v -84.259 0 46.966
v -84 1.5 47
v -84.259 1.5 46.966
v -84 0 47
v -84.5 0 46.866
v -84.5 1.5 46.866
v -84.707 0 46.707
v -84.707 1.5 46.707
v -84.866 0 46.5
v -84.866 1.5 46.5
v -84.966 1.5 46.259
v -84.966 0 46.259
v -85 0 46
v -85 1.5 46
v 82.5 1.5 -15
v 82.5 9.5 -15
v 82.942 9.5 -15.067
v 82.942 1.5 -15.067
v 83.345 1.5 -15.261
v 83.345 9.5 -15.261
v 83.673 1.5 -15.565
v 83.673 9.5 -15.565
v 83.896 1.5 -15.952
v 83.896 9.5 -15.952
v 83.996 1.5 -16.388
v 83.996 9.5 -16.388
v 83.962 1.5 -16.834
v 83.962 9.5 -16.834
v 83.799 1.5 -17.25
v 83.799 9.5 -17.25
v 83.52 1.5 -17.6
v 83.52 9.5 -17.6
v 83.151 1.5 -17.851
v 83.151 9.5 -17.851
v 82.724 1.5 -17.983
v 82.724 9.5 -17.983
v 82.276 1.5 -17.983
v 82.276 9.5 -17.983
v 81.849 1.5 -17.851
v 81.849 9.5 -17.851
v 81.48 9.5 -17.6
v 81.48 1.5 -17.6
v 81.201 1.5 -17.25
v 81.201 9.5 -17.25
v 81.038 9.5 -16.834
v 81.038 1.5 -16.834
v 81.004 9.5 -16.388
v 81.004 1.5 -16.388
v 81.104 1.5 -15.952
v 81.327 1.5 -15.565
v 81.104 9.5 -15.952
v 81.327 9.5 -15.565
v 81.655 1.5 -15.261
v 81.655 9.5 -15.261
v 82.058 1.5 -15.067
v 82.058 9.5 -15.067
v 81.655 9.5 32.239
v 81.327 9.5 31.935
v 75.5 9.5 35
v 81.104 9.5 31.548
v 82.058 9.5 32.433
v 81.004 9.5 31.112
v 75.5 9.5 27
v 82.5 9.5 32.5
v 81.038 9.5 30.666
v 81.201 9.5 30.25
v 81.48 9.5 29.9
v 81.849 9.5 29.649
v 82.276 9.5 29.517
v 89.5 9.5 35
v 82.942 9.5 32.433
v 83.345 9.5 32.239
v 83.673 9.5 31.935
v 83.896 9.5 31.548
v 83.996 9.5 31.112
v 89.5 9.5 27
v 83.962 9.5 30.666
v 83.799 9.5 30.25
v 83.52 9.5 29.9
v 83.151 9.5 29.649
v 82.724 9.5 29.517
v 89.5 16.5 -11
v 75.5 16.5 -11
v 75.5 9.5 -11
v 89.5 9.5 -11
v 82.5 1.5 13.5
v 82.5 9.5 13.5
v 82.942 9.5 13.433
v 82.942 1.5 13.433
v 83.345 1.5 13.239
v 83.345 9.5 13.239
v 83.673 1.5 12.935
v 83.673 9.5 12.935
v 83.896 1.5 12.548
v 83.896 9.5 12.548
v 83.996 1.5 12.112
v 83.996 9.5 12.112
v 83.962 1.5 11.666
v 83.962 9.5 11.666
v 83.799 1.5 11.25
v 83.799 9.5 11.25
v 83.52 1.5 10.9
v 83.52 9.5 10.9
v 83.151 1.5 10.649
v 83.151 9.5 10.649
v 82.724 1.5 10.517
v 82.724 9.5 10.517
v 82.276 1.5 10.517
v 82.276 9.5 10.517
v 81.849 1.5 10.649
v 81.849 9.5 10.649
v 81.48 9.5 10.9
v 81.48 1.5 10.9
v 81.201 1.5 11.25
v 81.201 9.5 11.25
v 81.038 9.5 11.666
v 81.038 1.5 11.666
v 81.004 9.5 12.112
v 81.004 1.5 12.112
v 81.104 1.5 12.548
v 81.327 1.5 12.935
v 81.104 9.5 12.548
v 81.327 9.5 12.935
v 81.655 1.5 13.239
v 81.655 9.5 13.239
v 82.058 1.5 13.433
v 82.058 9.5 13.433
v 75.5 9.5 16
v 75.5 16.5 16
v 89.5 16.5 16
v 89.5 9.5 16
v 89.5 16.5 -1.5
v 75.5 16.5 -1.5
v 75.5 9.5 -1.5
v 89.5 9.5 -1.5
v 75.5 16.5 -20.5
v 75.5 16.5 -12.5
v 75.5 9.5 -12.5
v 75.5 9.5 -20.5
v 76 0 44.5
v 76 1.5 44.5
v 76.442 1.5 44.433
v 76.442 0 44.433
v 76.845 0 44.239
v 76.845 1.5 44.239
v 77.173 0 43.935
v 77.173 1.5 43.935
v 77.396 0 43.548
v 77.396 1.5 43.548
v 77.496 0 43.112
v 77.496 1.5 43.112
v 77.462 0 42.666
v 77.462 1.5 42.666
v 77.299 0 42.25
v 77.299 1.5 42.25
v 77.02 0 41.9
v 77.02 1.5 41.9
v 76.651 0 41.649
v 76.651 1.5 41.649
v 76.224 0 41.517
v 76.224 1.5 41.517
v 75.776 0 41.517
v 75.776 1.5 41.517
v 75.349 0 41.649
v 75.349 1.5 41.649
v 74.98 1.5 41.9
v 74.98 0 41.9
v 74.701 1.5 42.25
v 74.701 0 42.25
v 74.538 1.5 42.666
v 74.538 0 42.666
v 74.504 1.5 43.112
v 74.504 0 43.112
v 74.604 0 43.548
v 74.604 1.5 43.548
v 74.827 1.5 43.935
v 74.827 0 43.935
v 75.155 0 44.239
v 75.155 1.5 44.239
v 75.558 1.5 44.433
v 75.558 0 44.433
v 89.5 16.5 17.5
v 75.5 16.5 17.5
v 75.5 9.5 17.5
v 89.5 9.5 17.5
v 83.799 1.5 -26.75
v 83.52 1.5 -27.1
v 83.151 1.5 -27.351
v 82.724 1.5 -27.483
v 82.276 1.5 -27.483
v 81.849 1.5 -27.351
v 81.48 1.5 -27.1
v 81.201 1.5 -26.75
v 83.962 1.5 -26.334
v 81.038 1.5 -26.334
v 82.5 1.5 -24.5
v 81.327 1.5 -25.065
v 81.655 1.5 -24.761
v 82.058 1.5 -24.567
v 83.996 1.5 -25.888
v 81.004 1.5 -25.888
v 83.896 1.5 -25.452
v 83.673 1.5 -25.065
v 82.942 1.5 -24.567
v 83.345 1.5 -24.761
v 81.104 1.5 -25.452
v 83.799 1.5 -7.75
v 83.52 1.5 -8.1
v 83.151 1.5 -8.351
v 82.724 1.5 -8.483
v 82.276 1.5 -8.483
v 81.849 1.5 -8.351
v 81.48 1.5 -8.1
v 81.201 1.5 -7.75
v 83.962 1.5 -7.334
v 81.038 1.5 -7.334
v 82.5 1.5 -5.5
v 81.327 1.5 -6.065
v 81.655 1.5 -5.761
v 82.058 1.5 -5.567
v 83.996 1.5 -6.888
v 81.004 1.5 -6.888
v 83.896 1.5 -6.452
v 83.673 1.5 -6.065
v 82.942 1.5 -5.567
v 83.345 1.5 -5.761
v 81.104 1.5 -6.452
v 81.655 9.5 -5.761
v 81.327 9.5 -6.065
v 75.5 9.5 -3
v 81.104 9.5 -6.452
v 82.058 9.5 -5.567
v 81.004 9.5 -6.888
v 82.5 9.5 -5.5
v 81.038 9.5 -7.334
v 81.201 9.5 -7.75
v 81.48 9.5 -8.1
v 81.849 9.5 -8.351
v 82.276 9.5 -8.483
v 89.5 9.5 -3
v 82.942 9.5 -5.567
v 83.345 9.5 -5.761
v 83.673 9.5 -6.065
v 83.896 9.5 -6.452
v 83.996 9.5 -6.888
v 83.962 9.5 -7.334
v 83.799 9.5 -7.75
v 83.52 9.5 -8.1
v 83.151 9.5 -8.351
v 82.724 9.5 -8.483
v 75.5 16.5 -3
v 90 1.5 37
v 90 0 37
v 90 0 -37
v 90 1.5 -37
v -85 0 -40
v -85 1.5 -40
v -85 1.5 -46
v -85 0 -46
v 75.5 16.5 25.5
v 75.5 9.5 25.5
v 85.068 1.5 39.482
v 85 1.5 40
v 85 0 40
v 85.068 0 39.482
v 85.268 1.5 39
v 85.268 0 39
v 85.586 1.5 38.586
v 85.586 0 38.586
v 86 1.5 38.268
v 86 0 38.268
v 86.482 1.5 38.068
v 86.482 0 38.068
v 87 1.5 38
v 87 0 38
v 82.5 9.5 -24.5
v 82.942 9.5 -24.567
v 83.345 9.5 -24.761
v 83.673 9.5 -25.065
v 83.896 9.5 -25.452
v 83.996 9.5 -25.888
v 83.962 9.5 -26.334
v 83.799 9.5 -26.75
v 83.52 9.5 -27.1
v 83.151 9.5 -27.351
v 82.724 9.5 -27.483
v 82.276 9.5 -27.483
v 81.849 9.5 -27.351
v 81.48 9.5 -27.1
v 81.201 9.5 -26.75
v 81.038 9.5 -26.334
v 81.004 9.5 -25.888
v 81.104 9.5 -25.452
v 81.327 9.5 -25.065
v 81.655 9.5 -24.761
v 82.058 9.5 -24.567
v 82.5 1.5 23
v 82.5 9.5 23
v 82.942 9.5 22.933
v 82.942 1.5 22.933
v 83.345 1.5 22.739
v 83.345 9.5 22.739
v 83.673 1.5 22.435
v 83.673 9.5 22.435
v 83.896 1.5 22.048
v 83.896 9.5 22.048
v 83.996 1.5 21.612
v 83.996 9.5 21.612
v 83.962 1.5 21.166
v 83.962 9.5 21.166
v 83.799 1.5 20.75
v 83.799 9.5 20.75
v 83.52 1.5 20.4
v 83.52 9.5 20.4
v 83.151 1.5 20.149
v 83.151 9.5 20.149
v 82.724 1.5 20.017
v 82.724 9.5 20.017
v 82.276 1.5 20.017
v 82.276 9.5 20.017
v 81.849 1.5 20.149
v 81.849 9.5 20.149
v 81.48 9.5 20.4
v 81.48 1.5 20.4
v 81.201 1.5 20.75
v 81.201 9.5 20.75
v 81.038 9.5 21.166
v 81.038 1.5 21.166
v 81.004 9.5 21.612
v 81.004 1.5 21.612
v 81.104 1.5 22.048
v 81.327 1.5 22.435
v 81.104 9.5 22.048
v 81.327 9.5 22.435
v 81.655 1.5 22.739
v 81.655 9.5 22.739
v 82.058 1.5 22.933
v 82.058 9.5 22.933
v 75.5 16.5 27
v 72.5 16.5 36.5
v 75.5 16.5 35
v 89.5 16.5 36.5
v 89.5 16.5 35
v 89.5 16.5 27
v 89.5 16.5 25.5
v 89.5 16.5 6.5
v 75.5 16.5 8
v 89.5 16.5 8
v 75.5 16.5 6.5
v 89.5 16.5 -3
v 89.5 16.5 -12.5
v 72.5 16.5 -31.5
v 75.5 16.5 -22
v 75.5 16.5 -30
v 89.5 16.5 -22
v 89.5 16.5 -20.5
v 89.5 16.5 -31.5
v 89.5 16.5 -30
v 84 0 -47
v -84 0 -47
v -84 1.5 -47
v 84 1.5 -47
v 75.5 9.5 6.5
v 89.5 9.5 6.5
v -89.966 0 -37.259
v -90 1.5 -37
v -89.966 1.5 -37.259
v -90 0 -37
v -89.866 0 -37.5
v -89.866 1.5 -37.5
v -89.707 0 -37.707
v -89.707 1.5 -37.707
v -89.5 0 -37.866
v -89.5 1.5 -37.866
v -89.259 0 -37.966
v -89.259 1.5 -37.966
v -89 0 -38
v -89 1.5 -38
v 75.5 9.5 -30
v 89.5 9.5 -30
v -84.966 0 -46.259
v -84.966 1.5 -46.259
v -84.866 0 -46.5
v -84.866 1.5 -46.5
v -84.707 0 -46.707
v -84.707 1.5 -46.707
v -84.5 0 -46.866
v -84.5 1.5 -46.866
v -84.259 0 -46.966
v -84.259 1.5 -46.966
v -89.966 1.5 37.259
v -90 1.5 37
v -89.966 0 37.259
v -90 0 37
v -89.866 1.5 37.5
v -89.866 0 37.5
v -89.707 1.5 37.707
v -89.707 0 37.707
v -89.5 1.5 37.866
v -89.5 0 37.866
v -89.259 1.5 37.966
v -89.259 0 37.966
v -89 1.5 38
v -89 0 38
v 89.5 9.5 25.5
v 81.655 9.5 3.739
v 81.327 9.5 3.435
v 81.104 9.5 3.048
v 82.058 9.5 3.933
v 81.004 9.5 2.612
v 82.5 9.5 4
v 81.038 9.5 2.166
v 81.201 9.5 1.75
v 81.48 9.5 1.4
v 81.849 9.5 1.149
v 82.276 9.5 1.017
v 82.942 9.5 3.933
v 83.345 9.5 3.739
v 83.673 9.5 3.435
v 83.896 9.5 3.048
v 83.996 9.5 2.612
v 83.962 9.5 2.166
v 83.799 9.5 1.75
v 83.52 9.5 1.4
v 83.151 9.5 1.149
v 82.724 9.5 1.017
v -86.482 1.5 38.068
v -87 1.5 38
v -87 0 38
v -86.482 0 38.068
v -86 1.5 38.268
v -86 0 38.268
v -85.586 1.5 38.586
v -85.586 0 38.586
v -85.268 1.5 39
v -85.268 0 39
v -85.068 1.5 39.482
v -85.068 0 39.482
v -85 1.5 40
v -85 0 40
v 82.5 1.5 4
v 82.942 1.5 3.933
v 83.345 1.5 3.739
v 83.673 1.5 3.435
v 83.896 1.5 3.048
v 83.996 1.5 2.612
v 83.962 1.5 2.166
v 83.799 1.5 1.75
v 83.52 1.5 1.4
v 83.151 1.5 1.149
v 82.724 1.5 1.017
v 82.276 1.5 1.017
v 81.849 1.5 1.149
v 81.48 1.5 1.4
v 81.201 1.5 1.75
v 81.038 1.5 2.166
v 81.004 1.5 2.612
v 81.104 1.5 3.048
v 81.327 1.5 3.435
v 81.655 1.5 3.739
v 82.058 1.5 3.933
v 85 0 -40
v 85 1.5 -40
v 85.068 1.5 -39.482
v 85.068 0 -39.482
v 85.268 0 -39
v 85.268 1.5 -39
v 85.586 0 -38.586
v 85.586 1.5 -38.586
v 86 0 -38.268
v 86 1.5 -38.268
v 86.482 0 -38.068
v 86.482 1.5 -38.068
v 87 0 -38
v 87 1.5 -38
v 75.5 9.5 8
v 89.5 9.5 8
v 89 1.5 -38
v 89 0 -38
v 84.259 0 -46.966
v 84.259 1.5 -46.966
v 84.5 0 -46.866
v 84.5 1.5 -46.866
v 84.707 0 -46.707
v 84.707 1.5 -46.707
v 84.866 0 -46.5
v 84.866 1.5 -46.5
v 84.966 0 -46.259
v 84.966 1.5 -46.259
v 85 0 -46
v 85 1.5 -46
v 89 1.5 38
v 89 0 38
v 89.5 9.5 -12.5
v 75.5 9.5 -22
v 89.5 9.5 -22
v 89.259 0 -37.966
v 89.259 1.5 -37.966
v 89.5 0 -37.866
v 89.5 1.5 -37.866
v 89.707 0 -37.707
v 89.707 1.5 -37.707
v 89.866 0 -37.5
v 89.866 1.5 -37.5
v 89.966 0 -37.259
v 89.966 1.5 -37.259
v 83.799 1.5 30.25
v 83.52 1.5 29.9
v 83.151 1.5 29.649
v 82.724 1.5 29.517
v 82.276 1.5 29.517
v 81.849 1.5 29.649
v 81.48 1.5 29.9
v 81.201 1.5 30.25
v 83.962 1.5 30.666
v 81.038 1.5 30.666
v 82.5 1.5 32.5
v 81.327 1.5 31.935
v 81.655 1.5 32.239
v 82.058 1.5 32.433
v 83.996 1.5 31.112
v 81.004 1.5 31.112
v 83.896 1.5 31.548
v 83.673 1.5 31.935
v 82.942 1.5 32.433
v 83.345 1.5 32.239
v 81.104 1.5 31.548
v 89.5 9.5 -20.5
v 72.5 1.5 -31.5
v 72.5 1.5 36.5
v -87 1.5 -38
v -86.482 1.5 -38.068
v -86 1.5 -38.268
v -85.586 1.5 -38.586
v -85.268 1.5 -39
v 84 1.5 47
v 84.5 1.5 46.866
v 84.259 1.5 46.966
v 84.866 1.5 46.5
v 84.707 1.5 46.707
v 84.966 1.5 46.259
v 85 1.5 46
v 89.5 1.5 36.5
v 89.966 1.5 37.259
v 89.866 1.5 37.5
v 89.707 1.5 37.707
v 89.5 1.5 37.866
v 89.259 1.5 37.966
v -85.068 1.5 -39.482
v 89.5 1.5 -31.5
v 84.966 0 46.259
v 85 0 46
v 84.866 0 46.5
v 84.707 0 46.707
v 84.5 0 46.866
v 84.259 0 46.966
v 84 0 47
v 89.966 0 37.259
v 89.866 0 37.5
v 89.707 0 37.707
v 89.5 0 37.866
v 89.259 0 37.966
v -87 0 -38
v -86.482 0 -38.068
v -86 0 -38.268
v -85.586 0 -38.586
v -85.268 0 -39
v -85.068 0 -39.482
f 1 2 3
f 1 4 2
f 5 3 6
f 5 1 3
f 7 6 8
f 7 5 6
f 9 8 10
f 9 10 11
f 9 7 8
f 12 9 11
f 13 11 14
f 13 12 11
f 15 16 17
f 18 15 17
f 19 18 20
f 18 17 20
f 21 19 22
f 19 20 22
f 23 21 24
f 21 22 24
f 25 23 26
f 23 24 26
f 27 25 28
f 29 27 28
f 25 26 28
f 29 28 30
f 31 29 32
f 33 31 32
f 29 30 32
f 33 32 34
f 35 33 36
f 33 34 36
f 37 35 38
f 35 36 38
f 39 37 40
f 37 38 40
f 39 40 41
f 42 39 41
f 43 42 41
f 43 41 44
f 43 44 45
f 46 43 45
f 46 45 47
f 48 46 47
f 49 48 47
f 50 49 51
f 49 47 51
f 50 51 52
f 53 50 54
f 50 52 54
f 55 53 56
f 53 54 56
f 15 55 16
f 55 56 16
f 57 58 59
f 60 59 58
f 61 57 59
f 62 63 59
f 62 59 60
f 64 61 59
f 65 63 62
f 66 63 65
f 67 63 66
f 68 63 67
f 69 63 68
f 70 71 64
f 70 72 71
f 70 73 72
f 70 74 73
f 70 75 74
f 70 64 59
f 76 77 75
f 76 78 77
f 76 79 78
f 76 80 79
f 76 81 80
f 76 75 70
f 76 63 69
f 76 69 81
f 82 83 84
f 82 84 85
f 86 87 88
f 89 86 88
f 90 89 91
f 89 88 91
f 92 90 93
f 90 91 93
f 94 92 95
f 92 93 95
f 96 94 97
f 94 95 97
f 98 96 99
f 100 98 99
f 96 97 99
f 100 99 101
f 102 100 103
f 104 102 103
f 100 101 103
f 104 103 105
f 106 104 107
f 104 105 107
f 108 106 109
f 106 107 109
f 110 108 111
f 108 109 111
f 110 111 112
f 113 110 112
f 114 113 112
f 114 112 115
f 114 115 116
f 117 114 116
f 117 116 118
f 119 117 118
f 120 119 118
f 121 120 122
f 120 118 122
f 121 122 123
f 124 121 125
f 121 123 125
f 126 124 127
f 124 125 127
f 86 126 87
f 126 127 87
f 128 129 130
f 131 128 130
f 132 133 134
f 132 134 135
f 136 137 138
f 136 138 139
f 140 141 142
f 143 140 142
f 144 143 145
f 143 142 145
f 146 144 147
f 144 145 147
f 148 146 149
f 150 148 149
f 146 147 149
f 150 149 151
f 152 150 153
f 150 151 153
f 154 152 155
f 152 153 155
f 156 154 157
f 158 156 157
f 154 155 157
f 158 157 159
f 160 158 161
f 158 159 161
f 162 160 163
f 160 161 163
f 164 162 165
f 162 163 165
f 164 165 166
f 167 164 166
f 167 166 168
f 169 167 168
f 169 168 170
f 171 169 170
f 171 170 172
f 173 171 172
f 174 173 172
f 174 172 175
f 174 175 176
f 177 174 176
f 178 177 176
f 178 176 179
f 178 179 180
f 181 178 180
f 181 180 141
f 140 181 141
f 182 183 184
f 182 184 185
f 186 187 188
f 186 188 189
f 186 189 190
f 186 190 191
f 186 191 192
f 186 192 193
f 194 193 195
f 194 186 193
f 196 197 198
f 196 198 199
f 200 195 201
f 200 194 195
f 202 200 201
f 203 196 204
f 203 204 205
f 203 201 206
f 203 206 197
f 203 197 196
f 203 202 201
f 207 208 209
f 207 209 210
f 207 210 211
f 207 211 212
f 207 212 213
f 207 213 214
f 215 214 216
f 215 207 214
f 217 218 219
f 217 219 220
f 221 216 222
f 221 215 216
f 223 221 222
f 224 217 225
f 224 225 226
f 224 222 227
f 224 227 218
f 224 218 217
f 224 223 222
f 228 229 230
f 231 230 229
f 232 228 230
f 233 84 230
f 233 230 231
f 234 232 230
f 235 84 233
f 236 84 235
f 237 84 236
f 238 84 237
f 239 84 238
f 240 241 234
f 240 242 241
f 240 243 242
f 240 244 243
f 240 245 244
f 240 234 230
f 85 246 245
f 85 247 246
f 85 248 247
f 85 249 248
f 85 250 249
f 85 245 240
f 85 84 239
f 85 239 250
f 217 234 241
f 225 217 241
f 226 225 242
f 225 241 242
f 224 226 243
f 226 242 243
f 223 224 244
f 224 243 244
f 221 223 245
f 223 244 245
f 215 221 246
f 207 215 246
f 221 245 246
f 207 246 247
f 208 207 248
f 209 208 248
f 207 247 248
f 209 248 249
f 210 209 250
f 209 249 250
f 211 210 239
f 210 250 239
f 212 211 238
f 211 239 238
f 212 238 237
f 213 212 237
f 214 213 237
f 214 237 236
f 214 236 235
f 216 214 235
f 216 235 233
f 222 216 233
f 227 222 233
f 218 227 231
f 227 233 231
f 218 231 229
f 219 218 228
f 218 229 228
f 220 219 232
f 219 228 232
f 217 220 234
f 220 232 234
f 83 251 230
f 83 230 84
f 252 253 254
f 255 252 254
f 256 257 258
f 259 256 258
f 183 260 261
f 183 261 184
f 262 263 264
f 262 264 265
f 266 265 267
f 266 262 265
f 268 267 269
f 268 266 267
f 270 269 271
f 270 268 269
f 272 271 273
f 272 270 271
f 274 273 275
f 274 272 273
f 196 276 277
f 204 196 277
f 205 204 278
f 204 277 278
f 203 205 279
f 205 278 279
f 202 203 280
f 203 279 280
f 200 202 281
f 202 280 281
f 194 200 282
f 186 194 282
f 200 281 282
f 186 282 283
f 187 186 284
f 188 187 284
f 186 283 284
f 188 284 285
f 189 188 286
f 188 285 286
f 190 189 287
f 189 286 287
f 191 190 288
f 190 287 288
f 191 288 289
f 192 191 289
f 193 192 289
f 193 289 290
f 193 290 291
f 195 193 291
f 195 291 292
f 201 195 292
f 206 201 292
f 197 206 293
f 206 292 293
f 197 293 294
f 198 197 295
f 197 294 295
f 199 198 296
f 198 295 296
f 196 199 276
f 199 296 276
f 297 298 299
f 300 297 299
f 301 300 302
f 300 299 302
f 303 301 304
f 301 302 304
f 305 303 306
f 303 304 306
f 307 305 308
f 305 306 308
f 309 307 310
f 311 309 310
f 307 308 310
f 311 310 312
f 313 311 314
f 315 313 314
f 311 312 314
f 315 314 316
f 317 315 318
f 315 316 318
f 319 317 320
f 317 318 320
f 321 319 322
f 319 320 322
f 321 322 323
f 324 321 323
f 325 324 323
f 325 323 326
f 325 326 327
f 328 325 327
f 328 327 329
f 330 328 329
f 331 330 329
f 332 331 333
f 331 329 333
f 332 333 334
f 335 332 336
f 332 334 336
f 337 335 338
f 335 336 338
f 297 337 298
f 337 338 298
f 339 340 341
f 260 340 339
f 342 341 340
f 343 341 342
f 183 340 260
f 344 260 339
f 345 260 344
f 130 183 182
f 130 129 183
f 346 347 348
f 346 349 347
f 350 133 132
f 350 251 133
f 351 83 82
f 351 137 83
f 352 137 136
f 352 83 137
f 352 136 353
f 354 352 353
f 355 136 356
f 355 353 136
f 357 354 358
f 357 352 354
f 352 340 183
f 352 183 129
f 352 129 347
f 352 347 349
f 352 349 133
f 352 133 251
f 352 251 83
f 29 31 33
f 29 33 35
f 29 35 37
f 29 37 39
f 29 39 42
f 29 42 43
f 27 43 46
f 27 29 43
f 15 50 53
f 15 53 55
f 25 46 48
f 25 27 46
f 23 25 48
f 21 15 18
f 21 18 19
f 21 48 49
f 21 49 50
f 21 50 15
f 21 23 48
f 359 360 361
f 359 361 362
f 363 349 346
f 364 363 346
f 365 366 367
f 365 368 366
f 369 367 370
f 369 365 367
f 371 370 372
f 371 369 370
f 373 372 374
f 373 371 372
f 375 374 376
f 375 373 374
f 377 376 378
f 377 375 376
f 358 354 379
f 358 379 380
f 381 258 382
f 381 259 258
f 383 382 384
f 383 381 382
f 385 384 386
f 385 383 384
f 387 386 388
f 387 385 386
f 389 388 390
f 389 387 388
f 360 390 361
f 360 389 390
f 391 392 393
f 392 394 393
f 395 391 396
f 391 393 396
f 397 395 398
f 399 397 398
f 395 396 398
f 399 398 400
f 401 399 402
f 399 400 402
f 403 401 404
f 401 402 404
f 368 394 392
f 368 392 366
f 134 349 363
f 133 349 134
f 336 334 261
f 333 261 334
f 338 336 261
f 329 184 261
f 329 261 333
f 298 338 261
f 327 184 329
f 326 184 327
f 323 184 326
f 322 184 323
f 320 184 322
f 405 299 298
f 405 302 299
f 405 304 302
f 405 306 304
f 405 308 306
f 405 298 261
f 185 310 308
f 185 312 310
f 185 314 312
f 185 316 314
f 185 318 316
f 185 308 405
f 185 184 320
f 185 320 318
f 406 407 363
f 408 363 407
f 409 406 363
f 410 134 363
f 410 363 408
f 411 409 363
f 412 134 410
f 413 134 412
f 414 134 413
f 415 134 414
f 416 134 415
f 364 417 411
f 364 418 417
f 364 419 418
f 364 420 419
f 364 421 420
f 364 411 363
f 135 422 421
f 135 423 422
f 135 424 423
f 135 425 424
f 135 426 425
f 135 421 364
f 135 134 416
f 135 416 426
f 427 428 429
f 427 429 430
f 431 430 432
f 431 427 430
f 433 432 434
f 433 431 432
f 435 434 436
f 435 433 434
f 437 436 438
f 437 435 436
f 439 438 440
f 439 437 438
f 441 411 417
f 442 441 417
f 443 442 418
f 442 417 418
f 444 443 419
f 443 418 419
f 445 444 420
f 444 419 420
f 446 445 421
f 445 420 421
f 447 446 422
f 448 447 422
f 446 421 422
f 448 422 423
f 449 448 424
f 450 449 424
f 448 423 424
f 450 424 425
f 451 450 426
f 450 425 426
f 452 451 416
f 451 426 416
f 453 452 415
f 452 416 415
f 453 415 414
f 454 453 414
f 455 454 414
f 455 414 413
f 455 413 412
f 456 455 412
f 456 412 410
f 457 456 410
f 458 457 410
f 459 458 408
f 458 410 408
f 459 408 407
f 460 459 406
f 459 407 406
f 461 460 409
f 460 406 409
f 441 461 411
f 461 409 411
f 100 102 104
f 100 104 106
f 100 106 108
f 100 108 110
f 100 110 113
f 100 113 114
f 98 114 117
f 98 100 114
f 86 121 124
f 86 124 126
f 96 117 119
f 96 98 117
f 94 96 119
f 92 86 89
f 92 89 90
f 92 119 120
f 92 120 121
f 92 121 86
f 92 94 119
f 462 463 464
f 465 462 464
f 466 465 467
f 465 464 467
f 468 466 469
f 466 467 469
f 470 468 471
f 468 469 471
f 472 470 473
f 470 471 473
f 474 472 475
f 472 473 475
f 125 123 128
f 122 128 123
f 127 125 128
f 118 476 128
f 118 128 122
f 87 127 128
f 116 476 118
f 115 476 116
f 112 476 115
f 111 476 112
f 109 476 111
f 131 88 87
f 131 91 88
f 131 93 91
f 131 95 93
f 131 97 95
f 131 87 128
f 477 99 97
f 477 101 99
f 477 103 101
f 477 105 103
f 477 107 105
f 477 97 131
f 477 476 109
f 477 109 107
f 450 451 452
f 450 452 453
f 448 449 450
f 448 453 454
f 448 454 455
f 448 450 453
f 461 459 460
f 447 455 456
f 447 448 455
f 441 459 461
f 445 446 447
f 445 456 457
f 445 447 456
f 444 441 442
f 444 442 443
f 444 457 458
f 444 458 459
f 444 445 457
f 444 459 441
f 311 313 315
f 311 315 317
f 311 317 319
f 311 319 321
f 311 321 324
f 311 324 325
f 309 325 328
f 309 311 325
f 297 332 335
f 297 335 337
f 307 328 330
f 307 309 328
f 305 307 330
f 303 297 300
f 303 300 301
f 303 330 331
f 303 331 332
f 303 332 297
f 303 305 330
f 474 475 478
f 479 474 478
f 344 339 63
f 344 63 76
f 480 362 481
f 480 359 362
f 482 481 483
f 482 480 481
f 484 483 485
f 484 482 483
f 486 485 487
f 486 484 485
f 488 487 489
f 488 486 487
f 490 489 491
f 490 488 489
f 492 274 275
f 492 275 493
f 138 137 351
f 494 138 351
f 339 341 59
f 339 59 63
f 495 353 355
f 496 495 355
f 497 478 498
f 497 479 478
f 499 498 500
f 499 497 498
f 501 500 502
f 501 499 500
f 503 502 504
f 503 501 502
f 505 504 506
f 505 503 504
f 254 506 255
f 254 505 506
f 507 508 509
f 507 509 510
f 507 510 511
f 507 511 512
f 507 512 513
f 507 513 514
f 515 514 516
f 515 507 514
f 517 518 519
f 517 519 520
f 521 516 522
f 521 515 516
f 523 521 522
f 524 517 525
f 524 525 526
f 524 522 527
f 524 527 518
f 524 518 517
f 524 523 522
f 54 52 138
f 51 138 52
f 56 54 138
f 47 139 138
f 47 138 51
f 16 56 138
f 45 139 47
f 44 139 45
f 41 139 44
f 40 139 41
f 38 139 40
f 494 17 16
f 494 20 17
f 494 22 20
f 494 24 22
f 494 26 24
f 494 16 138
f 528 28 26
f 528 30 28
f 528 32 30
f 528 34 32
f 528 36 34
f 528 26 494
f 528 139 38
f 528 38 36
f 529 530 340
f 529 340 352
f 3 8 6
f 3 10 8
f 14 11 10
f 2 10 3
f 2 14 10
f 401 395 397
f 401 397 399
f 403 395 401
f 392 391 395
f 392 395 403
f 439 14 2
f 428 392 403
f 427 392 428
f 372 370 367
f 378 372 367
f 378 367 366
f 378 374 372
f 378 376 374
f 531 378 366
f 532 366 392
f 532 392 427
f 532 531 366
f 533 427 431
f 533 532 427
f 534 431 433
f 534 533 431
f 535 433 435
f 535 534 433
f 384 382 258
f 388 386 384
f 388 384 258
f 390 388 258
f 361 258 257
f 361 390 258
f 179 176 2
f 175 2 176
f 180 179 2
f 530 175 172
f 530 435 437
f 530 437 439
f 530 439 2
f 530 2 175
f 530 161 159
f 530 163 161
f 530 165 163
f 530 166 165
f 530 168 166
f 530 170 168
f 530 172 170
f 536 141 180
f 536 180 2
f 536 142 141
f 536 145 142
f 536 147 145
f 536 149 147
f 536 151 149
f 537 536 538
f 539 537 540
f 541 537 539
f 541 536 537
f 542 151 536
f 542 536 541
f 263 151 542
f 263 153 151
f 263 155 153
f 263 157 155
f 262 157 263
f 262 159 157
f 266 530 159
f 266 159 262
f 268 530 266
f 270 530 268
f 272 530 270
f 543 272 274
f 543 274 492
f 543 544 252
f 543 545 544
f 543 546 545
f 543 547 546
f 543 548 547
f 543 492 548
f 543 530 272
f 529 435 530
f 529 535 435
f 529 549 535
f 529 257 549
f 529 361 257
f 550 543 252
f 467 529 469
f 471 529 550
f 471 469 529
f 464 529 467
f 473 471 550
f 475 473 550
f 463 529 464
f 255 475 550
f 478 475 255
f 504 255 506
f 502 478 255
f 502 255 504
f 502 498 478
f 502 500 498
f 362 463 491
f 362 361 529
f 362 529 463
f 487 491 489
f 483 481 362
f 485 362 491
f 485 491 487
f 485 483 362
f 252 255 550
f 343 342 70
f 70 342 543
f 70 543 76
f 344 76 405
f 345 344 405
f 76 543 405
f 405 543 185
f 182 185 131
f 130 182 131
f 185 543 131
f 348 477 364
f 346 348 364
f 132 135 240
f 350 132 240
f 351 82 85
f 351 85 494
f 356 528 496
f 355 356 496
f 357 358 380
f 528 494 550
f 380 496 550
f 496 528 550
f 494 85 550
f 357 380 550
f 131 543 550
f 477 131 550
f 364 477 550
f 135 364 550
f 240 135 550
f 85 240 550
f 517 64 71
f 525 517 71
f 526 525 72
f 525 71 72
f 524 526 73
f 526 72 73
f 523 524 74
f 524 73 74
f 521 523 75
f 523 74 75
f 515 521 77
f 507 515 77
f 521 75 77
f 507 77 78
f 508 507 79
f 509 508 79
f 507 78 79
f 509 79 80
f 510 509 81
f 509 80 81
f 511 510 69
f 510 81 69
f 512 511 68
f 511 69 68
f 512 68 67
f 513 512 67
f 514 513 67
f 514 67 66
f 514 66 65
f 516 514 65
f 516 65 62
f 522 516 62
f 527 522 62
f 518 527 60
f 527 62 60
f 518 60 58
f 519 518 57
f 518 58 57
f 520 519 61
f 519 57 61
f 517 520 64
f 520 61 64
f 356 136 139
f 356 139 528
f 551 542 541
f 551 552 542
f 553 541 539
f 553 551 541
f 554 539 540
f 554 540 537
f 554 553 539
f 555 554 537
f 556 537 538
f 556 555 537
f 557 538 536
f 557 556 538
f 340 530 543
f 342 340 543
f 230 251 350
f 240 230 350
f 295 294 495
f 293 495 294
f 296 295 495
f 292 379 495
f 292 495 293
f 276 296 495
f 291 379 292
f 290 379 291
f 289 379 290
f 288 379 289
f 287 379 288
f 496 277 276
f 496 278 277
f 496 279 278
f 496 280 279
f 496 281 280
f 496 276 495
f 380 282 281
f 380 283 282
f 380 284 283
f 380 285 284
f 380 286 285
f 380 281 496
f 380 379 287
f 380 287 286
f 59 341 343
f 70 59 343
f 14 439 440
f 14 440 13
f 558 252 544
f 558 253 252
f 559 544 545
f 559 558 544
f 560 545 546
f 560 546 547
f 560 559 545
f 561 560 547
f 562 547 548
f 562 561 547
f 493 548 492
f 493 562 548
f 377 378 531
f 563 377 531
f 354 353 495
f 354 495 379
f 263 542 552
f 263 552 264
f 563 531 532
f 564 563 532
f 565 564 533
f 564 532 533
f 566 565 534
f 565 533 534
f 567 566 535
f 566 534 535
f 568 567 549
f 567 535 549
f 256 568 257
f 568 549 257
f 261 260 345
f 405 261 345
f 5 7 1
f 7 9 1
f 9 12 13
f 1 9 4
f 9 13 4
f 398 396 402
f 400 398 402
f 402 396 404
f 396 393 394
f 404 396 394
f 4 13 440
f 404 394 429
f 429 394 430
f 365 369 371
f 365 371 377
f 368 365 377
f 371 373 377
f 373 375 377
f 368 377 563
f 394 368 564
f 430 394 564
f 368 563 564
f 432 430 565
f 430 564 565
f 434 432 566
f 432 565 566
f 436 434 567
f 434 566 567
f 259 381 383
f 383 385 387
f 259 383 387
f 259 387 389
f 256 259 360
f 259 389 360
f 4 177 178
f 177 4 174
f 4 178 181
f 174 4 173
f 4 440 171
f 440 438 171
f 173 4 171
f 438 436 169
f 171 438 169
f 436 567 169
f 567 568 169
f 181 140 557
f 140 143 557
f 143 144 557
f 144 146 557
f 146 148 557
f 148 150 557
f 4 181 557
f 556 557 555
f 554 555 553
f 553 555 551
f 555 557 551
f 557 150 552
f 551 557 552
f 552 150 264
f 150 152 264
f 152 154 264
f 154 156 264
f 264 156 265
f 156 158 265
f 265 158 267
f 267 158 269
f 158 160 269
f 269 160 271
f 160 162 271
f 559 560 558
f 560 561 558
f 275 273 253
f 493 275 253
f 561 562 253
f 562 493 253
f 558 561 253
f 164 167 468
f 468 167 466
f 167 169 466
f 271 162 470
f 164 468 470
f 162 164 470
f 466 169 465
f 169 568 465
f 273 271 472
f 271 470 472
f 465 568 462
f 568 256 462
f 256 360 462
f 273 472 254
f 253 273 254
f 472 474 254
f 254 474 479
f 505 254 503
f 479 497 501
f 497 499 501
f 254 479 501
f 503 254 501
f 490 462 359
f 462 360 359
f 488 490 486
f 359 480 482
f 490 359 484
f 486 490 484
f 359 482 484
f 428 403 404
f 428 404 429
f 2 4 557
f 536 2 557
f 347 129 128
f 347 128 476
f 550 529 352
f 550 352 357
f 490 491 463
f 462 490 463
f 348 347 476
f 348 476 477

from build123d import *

# Parameters (mm, degrees)
SKETCH_2_W          = 180
SKETCH_2_H          = 94
EXTRUDE_1_DEPTH     = 1.5
CUT_EXTRUDE_1_DEPTH = 1.5
FILLET_1_R          = 1
SKETCH_4_W          = 17
SKETCH_4_H          = 68
EXTRUDE_2_DEPTH     = 15
SKETCH_6_W          = 14
SKETCH_6_H          = 8
CUT_EXTRUDE_3_DEPTH = 7
SKETCH_7_R          = 1.5
CUT_EXTRUDE_4_DEPTH = 8
SKETCH_5_R          = 1.5
CUT_EXTRUDE_2_DEPTH = 103.635276587


with BuildPart() as part:
    # 草图2 → 凸台-拉伸1 (new body)
    with BuildSketch(Plane(origin=(0, 0, 0), x_dir=(1, 0, 0), z_dir=(0, 1, 0))):
        Rectangle(SKETCH_2_W, SKETCH_2_H)
    extrude(amount=EXTRUDE_1_DEPTH)

    # 草图3 → 切除-拉伸1 (cut)
    with BuildSketch(Plane(origin=(0, 1.5, 0), x_dir=(1, 0, 0), z_dir=(0, 1, 0))):
        with BuildLine():
            Line((85, 47), (85, 40))
            ThreePointArc((85, 40), (85.585786438, 38.585786438), (87, 38))
            Line((87, 38), (90, 38))
            Line((90, 38), (90, 47))
            Line((90, 47), (85, 47))
        make_face()
        with BuildLine():
            Line((87, -38), (90, -38))
            Line((90, -38), (90, -47))
            Line((90, -47), (85, -47))
            Line((85, -47), (85, -40))
            ThreePointArc((85, -40), (85.585786438, -38.585786438), (87, -38))
        make_face()
        with BuildLine():
            Line((-90, -47), (-90, -38))
            Line((-90, -38), (-87, -38))
            ThreePointArc((-87, -38), (-85.585786438, -38.585786438), (-85, -40))
            Line((-85, -40), (-85, -47))
            Line((-85, -47), (-90, -47))
        make_face()
        with BuildLine():
            Line((-90, 47), (-90, 38))
            Line((-90, 38), (-87, 38))
            ThreePointArc((-87, 38), (-85.585786438, 38.585786438), (-85, 40))
            Line((-85, 40), (-85, 47))
            Line((-85, 47), (-90, 47))
        make_face()
    extrude(amount=-CUT_EXTRUDE_1_DEPTH, mode=Mode.SUBTRACT)

    # 圆角1
    fillet_1_edges = [part.edges().sort_by_distance(p)[0] for p in [
        (85, 0.75, -47),
        (90, 0.75, -38),
        (90, 0.75, 38),
        (85, 0.75, 47),
        (-85, 0.75, 47),
        (-90, 0.75, 38),
        (-90, 0.75, -38),
        (-85, 0.75, -47),
    ]]
    fillet(fillet_1_edges, radius=FILLET_1_R)

    # 草图4 → 凸台-拉伸2 (add)
    with BuildSketch(Plane(origin=(0, 1.5, 0), x_dir=(1, 0, 0), z_dir=(0, 1, 0))):
        with Locations((81, -2.5)):
            Rectangle(SKETCH_4_W, SKETCH_4_H)
    extrude(amount=EXTRUDE_2_DEPTH)

    # 草图6 → 切除-拉伸3 (cut)
    with BuildSketch(Plane(origin=(0, 16.5, 0), x_dir=(1, 0, 0), z_dir=(0, 1, 0))):
        with Locations((82.5, 26)):
            Rectangle(SKETCH_6_W, SKETCH_6_H)
        with Locations((82.5, 16.5)):
            Rectangle(SKETCH_6_W, SKETCH_6_H)
        with Locations((82.5, 7)):
            Rectangle(SKETCH_6_W, SKETCH_6_H)
        with Locations((82.5, -2.5)):
            Rectangle(SKETCH_6_W, SKETCH_6_H)
        with Locations((82.5, -12)):
            Rectangle(SKETCH_6_W, SKETCH_6_H)
        with Locations((82.5, -21.5)):
            Rectangle(SKETCH_6_W, SKETCH_6_H)
        with Locations((82.5, -31)):
            Rectangle(SKETCH_6_W, SKETCH_6_H)
    extrude(amount=-CUT_EXTRUDE_3_DEPTH, mode=Mode.SUBTRACT)

    # 草图7 → 切除-拉伸4 (cut)
    with BuildSketch(Plane(origin=(0, 9.5, 0), x_dir=(1, 0, 0), z_dir=(0, 1, 0))):
        with Locations(Location((82.5, 26, 0), (0, 0, 270))):
            Circle(SKETCH_7_R)
        with Locations(Location((82.5, 16.5, 0), (0, 0, 270))):
            Circle(SKETCH_7_R)
        with Locations(Location((82.5, 7, 0), (0, 0, 270))):
            Circle(SKETCH_7_R)
        with Locations(Location((82.5, -2.5, 0), (0, 0, 270))):
            Circle(SKETCH_7_R)
        with Locations(Location((82.5, -12, 0), (0, 0, 270))):
            Circle(SKETCH_7_R)
        with Locations(Location((82.5, -21.5, 0), (0, 0, 270))):
            Circle(SKETCH_7_R)
        with Locations(Location((82.5, -31, 0), (0, 0, 270))):
            Circle(SKETCH_7_R)
    extrude(amount=-CUT_EXTRUDE_4_DEPTH, mode=Mode.SUBTRACT)

    # 草图5 → 切除-拉伸2 (cut, through all)
    with BuildSketch(Plane(origin=(0, 1.5, 0), x_dir=(1, 0, 0), z_dir=(0, 1, 0))):
        with Locations(Location((76, -43, 0), (0, 0, 270))):
            Circle(SKETCH_5_R)
    extrude(amount=-CUT_EXTRUDE_2_DEPTH, mode=Mode.SUBTRACT)


solid = part.part
